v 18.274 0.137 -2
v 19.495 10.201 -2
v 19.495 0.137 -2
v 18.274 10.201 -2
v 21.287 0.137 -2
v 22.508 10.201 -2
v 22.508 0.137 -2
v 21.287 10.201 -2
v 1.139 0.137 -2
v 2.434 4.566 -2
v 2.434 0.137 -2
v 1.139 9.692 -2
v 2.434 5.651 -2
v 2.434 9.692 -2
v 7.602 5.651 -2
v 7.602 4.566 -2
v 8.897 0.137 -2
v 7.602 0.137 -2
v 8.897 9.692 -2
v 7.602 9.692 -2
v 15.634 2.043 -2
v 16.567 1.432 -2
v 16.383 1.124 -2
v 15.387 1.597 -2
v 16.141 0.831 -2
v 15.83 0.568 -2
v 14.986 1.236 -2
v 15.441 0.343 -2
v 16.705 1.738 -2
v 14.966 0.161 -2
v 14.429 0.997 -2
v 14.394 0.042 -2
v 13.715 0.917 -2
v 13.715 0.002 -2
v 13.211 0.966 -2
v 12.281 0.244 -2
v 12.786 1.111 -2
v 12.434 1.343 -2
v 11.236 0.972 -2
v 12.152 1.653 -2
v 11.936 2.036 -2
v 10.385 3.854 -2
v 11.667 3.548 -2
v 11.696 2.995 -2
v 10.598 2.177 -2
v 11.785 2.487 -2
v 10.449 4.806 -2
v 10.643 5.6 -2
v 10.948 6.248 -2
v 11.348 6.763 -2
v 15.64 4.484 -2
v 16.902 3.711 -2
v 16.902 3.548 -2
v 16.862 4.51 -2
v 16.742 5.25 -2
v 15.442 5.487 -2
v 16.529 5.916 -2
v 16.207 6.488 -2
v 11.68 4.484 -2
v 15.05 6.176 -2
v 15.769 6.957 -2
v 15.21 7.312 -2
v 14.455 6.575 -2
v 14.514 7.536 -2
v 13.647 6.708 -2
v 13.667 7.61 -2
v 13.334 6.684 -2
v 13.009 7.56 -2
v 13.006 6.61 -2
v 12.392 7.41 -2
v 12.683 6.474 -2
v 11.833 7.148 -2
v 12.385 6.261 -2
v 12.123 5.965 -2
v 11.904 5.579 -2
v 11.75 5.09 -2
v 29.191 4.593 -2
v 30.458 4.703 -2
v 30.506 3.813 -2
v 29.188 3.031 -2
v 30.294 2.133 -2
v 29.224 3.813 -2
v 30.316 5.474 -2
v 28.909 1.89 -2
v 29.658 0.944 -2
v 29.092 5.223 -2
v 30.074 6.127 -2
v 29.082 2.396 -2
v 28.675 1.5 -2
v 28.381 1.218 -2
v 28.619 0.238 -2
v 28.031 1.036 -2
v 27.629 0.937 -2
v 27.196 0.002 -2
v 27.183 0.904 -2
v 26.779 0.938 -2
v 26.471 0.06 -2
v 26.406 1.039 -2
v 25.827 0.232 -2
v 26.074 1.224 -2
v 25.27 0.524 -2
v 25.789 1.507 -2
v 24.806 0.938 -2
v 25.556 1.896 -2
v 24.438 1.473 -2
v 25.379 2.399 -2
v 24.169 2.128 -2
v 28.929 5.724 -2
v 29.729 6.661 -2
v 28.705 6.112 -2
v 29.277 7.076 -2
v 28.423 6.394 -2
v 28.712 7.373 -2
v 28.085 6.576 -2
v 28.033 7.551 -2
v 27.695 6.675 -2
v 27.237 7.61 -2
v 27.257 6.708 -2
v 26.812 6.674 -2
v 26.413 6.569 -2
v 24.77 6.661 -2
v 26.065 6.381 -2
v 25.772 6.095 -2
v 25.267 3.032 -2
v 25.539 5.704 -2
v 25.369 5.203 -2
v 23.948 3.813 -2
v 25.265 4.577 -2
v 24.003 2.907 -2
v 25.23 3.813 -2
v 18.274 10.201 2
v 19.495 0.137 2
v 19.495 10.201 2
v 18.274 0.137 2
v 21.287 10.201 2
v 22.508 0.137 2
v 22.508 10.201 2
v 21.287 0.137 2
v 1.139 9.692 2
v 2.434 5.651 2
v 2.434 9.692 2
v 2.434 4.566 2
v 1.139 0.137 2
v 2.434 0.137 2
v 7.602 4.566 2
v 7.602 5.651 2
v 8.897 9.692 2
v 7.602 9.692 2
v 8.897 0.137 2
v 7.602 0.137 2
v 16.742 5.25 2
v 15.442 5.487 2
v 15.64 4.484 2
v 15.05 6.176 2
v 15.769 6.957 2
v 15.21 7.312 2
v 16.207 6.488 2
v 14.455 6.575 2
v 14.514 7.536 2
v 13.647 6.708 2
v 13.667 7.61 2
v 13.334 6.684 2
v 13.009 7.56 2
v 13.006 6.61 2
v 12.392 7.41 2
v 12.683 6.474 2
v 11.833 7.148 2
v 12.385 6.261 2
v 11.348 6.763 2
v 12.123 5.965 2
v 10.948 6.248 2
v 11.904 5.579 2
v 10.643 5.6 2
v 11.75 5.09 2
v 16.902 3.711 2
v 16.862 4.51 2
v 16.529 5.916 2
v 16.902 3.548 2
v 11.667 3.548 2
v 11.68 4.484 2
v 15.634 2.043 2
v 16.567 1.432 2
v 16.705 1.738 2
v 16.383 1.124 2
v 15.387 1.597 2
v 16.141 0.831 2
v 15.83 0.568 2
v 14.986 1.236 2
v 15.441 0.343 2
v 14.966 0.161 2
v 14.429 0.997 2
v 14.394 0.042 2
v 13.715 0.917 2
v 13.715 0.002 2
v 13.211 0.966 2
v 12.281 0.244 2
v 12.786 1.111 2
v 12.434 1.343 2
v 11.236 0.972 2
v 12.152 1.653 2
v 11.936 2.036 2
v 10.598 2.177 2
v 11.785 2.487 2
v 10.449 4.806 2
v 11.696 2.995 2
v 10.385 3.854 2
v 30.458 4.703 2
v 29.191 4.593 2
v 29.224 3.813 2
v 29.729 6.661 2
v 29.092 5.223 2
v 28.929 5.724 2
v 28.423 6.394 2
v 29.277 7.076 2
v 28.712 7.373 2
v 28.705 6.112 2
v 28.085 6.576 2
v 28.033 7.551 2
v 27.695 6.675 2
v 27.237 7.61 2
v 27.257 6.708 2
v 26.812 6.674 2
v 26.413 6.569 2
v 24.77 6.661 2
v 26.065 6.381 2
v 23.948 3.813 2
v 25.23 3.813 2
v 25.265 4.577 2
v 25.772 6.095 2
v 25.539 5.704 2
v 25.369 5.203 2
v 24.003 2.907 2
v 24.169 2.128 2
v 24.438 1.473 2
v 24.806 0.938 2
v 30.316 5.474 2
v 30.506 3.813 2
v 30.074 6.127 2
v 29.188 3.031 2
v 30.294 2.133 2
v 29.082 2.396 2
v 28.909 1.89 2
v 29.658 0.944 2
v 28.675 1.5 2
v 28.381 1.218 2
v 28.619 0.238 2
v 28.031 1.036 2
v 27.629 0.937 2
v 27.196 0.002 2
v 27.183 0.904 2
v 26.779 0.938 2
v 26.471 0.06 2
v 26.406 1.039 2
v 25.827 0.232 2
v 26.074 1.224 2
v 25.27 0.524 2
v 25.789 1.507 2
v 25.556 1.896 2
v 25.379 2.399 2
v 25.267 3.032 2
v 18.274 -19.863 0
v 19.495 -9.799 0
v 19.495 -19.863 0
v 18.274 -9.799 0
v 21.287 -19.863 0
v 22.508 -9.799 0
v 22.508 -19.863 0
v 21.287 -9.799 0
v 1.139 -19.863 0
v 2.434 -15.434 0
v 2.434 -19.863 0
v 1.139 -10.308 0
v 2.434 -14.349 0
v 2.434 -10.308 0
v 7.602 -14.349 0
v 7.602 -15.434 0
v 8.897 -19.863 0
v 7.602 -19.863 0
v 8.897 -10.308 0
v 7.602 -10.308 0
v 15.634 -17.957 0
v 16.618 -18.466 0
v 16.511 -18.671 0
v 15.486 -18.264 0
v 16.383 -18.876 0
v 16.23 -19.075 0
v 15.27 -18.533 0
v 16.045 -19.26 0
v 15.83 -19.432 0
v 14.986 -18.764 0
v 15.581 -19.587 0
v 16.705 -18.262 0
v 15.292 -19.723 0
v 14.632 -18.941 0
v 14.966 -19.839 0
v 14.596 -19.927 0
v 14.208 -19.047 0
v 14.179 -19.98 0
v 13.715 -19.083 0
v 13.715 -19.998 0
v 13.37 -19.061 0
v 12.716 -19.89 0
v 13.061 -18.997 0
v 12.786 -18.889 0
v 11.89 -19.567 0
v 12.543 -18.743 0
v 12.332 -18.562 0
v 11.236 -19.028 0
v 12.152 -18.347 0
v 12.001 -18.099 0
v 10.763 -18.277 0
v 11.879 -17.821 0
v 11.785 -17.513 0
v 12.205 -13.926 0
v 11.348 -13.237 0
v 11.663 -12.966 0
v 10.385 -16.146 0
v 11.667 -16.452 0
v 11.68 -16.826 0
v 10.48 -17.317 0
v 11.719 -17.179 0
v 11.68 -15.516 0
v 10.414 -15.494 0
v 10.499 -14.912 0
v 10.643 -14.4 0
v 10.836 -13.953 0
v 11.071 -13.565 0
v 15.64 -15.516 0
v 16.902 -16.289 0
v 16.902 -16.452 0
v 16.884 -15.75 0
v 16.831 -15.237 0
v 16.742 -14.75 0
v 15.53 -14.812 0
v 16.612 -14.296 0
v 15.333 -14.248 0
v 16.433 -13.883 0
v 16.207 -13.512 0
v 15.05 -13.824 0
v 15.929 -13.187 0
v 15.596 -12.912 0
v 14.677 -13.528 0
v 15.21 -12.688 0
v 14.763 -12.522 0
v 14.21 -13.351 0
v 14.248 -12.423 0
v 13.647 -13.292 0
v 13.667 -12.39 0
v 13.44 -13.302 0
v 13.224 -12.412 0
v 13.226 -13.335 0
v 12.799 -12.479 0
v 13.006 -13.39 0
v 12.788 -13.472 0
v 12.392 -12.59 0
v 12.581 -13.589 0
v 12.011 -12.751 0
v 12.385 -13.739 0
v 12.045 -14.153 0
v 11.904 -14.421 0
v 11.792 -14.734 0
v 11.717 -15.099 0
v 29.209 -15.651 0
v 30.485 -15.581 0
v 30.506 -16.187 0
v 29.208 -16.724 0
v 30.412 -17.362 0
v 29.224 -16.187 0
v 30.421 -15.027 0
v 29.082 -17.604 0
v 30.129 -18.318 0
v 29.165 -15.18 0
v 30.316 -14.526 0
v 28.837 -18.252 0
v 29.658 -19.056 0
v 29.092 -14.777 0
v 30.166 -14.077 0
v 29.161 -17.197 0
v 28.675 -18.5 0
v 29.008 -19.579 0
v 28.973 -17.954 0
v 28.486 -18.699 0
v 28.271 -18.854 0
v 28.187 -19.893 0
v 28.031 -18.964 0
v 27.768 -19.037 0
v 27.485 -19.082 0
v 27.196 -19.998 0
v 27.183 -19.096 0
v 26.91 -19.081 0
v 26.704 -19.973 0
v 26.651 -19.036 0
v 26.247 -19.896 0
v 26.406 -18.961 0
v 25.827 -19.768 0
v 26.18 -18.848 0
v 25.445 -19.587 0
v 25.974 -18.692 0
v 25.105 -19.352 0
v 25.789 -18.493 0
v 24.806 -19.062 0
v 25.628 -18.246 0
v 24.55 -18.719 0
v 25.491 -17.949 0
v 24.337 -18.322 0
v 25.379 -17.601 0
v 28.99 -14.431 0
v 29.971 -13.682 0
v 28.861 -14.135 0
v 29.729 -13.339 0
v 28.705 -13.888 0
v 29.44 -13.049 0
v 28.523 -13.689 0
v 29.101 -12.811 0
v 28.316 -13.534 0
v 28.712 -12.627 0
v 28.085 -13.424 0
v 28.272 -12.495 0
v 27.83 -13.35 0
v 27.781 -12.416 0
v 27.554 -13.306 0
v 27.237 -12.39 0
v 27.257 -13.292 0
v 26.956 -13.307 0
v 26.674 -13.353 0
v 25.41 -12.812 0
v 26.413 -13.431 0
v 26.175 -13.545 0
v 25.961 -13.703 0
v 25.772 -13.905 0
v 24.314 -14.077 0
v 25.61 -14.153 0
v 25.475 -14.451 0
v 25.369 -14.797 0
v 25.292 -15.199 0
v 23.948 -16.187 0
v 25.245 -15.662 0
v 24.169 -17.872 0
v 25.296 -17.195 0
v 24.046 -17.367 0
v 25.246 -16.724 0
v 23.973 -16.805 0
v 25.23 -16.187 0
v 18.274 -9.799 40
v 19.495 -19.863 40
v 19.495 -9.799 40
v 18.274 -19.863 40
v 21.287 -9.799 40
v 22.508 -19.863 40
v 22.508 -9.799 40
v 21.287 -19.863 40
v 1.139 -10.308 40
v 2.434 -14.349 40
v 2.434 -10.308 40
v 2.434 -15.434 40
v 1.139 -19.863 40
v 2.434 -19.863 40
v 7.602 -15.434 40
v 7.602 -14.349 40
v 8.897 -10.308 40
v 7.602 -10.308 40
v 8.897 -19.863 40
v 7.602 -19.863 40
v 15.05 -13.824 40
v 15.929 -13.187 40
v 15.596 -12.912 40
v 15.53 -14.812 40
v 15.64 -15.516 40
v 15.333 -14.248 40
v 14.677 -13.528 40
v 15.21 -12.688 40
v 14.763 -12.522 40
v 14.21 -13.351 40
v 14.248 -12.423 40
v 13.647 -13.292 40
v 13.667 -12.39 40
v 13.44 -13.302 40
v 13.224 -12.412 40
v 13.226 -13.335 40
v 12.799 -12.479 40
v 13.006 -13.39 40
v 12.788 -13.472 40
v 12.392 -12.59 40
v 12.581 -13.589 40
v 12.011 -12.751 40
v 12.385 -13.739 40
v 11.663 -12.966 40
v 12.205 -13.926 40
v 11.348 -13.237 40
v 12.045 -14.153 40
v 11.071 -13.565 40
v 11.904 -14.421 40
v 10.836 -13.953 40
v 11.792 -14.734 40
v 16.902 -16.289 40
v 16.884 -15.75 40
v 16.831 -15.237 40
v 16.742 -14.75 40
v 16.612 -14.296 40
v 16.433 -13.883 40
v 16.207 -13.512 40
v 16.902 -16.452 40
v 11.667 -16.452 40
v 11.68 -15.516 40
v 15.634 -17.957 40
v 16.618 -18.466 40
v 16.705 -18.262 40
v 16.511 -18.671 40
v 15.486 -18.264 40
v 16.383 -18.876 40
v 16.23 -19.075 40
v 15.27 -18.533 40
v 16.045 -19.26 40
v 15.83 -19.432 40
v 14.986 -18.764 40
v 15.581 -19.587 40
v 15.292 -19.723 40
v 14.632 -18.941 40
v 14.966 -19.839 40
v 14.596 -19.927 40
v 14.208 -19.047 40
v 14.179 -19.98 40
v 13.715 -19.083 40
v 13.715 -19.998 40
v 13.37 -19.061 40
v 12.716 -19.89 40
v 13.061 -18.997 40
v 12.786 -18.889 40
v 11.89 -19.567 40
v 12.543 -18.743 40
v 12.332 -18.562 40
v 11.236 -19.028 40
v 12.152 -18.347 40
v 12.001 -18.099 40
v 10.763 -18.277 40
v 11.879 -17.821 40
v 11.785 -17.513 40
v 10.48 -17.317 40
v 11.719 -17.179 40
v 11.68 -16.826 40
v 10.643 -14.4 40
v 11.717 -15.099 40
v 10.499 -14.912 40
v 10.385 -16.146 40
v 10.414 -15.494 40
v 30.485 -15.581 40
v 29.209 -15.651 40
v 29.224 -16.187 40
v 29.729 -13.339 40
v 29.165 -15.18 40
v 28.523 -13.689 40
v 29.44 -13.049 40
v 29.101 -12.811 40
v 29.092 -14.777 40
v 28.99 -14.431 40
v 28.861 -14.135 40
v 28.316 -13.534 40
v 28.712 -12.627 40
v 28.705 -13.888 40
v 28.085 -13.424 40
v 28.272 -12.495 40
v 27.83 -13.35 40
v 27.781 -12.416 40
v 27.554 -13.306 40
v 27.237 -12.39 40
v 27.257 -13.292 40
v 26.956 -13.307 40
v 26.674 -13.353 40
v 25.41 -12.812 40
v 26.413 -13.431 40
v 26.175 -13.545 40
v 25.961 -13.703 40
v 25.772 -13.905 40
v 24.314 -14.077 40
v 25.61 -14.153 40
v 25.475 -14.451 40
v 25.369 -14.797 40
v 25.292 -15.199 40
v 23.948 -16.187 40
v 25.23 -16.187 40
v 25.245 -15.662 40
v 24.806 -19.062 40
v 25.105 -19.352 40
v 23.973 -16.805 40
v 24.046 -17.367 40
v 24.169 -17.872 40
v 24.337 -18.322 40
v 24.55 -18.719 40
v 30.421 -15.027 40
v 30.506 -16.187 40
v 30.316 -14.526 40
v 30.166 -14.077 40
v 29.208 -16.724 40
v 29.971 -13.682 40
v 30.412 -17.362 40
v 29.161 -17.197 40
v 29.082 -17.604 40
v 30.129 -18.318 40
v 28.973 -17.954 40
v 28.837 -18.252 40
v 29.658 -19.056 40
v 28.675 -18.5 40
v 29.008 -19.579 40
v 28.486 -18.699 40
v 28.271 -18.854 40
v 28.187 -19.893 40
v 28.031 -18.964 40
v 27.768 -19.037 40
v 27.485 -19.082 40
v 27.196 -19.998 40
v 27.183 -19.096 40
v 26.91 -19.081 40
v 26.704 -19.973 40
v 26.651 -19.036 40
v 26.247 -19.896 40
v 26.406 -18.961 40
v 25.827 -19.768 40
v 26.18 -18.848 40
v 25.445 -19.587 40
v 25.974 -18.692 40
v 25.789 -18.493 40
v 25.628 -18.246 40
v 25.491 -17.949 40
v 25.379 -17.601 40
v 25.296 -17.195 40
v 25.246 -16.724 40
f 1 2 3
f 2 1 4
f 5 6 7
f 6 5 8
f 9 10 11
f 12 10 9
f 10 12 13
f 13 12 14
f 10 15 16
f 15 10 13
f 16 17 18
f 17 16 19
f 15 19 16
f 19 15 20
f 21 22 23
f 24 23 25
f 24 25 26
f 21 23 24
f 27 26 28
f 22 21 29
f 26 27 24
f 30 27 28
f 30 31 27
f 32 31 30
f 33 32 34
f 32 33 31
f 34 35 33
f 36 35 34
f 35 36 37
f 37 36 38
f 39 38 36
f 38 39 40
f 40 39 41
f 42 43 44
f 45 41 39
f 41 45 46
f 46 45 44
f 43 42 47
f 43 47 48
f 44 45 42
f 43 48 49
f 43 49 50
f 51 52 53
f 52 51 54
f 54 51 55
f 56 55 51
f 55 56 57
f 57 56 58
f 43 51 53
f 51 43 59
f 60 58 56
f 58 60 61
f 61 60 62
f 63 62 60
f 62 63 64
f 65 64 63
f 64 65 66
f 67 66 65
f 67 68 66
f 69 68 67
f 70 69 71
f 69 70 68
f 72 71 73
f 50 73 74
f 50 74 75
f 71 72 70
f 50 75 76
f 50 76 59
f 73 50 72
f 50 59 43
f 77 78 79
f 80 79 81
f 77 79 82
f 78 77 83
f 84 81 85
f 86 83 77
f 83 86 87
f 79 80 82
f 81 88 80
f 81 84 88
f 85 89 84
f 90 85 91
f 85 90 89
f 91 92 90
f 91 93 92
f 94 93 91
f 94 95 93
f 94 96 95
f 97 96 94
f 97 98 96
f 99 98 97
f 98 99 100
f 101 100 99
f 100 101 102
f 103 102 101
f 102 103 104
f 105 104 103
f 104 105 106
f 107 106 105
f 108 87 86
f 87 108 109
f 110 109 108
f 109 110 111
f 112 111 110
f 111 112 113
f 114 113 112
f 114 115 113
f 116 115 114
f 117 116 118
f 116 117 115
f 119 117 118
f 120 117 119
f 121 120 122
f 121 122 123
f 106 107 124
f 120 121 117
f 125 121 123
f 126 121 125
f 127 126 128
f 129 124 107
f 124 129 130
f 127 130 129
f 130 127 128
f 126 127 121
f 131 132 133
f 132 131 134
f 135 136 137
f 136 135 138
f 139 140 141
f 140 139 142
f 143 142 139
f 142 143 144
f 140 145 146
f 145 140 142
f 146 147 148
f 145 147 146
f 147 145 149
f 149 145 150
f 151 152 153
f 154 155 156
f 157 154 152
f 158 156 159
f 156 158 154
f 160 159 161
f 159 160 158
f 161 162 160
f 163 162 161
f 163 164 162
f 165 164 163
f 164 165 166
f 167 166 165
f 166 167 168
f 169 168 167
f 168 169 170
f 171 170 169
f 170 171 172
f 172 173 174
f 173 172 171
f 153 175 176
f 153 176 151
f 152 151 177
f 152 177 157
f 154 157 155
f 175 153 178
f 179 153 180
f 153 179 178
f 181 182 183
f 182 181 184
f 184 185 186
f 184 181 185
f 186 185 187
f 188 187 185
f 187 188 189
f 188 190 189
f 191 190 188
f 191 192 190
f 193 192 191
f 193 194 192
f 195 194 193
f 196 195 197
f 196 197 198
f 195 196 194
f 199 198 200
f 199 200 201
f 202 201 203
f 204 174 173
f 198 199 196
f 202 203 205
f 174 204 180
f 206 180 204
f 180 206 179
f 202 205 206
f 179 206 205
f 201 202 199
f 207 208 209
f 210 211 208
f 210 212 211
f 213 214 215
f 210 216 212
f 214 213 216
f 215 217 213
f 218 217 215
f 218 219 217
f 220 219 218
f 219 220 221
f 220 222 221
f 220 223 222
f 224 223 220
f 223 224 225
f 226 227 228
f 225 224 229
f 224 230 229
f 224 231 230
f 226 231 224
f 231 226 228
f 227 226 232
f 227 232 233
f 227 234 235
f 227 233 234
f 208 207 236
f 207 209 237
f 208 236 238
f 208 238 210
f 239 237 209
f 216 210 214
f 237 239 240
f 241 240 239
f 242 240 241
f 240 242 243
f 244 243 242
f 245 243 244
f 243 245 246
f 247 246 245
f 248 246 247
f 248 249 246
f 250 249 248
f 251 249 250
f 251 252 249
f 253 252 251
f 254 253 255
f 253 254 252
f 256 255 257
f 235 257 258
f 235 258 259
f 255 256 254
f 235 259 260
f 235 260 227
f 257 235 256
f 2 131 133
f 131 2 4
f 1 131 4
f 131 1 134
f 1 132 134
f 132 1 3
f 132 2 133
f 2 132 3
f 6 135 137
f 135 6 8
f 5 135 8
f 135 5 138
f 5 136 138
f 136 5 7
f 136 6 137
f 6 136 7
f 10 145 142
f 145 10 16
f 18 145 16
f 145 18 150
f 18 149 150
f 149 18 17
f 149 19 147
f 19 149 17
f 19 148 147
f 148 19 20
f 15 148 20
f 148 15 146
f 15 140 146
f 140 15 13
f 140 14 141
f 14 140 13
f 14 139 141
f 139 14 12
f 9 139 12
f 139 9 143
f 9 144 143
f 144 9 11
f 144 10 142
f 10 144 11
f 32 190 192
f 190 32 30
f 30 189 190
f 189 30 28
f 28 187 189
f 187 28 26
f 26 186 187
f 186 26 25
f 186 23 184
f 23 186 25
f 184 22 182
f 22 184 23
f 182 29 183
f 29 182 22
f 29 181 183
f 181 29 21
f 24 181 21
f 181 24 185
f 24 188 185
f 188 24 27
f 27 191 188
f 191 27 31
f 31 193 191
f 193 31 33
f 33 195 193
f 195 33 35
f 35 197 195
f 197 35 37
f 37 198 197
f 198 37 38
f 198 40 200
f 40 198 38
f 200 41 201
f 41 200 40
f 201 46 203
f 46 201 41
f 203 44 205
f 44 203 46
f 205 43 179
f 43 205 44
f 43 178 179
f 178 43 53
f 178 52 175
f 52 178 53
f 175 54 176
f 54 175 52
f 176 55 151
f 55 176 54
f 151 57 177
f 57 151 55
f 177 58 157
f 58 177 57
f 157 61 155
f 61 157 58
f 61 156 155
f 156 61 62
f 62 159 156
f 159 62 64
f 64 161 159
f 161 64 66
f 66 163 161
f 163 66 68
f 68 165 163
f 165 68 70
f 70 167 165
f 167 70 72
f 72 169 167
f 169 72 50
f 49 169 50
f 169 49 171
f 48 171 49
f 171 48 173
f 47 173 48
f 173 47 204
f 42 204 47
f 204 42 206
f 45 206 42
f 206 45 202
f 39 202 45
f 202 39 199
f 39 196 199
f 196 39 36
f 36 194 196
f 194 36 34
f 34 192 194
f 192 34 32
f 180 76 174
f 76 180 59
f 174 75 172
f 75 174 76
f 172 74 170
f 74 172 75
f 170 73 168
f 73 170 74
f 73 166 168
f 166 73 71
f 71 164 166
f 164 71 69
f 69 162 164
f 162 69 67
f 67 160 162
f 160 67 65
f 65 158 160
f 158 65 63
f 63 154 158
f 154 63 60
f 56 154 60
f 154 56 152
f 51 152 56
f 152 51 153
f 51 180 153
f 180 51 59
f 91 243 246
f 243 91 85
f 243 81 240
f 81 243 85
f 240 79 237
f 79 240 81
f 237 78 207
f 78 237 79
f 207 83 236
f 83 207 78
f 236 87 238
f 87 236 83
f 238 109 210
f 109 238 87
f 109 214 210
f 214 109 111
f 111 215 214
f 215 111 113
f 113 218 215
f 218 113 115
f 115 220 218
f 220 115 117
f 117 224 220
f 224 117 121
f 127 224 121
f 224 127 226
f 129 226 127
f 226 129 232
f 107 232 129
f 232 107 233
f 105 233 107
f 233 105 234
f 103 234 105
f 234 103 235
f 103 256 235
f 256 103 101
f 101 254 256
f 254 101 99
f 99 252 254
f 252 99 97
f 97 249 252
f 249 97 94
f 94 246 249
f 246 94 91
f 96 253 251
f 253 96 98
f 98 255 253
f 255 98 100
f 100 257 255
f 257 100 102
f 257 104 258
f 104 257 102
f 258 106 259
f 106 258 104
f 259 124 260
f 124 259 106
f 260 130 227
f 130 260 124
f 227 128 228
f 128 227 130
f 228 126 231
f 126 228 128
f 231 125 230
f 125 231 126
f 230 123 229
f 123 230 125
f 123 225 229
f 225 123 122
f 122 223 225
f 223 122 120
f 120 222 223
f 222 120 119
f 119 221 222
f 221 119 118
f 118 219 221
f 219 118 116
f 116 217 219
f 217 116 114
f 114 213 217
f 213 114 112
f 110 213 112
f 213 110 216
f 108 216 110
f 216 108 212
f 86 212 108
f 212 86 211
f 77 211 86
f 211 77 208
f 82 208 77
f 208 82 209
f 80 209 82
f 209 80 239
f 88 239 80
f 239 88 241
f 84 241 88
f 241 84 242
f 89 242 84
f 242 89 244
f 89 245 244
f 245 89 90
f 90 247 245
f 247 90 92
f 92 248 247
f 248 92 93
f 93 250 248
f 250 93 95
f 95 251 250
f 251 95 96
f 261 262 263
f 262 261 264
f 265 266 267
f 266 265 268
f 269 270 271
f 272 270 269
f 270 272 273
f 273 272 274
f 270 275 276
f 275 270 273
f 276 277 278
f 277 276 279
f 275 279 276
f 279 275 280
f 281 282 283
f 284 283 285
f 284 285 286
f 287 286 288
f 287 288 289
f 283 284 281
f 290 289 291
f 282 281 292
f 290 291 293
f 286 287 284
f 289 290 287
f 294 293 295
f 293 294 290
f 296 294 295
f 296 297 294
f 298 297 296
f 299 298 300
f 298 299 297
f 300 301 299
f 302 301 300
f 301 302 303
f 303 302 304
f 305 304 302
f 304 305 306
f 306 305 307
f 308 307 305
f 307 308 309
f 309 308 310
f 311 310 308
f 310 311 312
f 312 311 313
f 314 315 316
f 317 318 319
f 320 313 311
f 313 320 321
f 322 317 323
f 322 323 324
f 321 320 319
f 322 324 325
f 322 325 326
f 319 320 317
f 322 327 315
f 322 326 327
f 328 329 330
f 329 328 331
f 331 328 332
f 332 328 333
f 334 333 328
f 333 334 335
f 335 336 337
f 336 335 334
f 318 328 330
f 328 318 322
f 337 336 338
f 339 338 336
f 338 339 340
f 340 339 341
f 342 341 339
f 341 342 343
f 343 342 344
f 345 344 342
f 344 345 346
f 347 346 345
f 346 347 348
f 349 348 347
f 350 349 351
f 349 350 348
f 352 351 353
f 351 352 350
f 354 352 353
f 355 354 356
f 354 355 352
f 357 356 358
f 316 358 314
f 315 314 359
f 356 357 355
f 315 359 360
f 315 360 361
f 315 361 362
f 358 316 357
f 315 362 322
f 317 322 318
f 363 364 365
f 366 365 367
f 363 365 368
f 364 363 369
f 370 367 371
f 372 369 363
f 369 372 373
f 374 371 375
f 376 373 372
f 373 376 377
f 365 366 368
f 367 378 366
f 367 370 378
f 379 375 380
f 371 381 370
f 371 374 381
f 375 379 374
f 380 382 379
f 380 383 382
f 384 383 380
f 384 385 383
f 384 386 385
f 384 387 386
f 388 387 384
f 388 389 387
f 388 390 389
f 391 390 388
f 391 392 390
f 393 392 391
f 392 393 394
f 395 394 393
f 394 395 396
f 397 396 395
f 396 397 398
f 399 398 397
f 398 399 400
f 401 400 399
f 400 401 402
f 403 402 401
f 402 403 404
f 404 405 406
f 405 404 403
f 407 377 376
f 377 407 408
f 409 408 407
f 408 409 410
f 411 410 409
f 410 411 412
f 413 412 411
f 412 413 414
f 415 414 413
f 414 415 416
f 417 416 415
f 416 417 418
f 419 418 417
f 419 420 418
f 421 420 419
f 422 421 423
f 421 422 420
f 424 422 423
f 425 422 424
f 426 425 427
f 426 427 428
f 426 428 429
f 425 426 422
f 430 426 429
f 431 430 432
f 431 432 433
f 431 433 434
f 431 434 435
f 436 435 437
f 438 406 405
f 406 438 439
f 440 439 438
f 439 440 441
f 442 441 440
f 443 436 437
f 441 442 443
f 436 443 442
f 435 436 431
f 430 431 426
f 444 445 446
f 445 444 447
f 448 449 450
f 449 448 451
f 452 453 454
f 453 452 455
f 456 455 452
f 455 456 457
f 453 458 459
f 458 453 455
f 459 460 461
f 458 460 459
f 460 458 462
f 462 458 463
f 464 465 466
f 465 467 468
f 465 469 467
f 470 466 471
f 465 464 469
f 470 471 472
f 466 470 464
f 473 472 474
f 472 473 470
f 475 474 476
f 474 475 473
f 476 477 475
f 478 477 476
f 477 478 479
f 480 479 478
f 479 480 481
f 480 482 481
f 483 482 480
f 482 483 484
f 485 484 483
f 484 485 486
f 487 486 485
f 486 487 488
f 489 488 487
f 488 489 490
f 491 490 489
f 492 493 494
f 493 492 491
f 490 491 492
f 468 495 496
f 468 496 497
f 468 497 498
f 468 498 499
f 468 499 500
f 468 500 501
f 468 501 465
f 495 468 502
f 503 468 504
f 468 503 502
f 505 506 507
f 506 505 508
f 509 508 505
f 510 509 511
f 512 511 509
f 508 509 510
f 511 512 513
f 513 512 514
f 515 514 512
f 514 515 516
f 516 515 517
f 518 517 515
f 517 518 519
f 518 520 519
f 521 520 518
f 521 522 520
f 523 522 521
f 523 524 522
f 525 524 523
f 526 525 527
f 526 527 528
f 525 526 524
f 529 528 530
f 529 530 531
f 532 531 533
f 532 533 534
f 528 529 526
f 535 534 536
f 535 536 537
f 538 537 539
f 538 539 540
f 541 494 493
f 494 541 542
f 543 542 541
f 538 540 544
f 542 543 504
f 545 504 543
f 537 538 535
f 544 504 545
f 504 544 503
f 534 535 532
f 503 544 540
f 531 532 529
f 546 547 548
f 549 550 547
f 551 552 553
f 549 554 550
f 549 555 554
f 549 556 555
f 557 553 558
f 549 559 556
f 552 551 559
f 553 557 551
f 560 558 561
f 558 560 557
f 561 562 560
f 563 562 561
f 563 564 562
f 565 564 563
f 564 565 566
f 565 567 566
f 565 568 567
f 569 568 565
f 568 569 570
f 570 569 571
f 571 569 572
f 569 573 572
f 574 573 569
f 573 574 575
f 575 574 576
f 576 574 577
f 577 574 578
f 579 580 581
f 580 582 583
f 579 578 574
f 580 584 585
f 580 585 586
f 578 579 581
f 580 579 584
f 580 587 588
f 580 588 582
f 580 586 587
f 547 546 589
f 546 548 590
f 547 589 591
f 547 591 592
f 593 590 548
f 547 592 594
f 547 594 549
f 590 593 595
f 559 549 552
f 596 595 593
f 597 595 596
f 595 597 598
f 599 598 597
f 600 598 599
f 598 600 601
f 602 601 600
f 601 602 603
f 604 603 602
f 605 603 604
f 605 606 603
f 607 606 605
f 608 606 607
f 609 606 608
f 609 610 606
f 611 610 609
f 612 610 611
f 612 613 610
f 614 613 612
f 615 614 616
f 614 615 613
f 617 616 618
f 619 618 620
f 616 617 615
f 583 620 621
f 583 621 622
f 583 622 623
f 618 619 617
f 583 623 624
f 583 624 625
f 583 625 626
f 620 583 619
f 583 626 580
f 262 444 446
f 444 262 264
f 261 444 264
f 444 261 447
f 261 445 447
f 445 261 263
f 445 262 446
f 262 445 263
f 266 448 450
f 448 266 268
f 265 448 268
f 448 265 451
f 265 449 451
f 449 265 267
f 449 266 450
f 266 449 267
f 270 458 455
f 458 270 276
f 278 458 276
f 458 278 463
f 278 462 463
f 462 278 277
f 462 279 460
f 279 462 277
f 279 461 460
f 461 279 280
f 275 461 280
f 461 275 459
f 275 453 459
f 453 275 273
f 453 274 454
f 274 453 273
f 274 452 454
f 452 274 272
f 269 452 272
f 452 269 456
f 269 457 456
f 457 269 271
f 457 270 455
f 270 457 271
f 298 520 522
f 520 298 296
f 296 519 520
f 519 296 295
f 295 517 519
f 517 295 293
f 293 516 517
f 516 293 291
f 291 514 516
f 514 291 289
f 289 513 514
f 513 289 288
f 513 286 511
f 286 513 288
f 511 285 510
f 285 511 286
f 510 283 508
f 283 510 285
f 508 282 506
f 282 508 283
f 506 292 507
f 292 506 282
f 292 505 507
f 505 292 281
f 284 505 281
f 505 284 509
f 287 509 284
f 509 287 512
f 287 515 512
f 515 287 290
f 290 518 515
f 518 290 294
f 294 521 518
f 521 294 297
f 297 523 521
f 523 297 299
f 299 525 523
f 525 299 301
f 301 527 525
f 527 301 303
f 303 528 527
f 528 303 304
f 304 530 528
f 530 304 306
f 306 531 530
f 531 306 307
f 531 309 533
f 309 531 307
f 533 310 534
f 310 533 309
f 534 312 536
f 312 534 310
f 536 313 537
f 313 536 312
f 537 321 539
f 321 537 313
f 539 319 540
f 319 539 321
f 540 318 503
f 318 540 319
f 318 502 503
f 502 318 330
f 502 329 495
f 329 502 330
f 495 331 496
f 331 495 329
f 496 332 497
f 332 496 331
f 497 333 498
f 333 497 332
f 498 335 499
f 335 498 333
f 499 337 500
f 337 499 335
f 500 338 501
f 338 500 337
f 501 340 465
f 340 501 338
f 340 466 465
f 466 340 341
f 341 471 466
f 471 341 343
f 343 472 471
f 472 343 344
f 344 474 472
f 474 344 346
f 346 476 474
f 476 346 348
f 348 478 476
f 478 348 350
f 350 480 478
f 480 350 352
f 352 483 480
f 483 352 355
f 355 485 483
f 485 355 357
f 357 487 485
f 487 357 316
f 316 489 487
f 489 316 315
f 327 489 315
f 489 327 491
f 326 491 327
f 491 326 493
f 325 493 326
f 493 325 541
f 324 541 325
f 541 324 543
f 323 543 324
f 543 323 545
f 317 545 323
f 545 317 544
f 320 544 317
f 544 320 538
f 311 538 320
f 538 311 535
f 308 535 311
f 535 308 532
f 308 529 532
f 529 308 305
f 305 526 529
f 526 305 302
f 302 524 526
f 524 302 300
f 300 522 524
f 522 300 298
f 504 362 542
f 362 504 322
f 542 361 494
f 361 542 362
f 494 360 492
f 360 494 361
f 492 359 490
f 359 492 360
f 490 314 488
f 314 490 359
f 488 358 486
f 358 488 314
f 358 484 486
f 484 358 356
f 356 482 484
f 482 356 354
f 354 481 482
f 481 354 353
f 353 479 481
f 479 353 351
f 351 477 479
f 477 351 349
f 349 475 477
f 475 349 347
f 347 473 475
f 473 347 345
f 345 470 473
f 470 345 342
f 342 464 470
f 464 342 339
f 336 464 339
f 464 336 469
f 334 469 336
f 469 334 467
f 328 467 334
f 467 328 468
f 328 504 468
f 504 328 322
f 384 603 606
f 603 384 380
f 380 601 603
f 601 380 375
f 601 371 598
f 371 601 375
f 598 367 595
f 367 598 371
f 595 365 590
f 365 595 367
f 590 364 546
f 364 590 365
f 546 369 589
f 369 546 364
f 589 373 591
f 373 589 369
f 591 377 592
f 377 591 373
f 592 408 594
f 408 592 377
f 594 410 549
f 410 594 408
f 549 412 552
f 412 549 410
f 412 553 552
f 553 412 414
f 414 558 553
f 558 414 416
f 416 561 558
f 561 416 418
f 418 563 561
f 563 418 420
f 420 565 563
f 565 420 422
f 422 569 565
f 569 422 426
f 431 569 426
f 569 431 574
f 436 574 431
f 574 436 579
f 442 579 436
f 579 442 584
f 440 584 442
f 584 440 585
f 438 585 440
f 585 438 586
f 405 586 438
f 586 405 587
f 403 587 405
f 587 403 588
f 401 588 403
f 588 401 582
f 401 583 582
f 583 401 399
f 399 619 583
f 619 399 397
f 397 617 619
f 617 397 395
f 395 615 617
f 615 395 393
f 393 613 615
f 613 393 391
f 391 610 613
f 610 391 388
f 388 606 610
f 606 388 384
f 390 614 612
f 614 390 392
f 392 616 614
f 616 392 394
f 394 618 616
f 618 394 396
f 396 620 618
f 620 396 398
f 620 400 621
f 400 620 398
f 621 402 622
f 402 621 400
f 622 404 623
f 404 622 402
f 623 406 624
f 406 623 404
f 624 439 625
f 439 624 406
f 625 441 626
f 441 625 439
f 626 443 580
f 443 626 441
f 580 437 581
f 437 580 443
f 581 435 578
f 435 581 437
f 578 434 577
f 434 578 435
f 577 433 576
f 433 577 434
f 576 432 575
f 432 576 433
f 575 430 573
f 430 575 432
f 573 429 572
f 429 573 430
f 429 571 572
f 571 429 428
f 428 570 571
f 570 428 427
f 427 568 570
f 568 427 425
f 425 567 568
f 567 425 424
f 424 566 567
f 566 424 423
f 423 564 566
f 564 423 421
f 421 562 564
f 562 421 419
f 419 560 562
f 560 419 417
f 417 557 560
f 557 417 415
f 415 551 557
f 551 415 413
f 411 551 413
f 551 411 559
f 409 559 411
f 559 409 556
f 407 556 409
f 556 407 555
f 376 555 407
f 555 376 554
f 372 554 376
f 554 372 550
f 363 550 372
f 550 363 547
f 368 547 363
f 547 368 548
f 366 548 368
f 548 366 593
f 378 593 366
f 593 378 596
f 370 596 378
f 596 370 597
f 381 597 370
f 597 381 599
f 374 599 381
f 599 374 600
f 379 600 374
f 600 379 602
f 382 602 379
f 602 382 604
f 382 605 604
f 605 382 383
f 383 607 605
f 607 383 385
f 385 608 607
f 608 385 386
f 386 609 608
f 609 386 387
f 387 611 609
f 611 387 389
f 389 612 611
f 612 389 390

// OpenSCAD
// Start: lazy_union
default_5_default_5();
// End: lazy_union

// Modules.

// 'PartMaterial undef-default - undef-default'
module default_5_default_5() {
  // 'None : _combine_solids_and_holes'
  union() {
    // 'default_text'
    multmatrix(m=[[1.0, 0.0, 0.0, 0.0], [0.0, 1.0, 0.0, 0.0], [0.0, 0.0, 1.0, -2.0], [0.0, 0.0, 0.0, 1.0]]) {
      // 'default_text : _combine_solids_and_holes'
      union() {
        // 'default_text'
        linear_extrude(height=4.0) {
          translate(v=[0.0, 0.0, -2.0]) {
            text(text="Hello", size=10.0, halign="left", valign="bottom", spacing=1.0, direction="ltr", $fn=10);
          }
        }
      }
    }
    // 'scaled_text'
    multmatrix(m=[[1.0, 0.0, 0.0, 0.0], [0.0, 1.0, 0.0, -20.0], [0.0, 0.0, 10.0, 0.0], [0.0, 0.0, 0.0, 1.0]]) {
      // 'scaled_text : _combine_solids_and_holes'
      union() {
        // 'scaled_text'
        linear_extrude(height=4.0) {
          translate(v=[0.0, 0.0, -2.0]) {
            text(text="Hello", size=10.0, halign="left", valign="bottom", spacing=1.0, direction="ltr", $fn=20);
          }
        }
      }
    }
  }
} // end module default_5_default_5
